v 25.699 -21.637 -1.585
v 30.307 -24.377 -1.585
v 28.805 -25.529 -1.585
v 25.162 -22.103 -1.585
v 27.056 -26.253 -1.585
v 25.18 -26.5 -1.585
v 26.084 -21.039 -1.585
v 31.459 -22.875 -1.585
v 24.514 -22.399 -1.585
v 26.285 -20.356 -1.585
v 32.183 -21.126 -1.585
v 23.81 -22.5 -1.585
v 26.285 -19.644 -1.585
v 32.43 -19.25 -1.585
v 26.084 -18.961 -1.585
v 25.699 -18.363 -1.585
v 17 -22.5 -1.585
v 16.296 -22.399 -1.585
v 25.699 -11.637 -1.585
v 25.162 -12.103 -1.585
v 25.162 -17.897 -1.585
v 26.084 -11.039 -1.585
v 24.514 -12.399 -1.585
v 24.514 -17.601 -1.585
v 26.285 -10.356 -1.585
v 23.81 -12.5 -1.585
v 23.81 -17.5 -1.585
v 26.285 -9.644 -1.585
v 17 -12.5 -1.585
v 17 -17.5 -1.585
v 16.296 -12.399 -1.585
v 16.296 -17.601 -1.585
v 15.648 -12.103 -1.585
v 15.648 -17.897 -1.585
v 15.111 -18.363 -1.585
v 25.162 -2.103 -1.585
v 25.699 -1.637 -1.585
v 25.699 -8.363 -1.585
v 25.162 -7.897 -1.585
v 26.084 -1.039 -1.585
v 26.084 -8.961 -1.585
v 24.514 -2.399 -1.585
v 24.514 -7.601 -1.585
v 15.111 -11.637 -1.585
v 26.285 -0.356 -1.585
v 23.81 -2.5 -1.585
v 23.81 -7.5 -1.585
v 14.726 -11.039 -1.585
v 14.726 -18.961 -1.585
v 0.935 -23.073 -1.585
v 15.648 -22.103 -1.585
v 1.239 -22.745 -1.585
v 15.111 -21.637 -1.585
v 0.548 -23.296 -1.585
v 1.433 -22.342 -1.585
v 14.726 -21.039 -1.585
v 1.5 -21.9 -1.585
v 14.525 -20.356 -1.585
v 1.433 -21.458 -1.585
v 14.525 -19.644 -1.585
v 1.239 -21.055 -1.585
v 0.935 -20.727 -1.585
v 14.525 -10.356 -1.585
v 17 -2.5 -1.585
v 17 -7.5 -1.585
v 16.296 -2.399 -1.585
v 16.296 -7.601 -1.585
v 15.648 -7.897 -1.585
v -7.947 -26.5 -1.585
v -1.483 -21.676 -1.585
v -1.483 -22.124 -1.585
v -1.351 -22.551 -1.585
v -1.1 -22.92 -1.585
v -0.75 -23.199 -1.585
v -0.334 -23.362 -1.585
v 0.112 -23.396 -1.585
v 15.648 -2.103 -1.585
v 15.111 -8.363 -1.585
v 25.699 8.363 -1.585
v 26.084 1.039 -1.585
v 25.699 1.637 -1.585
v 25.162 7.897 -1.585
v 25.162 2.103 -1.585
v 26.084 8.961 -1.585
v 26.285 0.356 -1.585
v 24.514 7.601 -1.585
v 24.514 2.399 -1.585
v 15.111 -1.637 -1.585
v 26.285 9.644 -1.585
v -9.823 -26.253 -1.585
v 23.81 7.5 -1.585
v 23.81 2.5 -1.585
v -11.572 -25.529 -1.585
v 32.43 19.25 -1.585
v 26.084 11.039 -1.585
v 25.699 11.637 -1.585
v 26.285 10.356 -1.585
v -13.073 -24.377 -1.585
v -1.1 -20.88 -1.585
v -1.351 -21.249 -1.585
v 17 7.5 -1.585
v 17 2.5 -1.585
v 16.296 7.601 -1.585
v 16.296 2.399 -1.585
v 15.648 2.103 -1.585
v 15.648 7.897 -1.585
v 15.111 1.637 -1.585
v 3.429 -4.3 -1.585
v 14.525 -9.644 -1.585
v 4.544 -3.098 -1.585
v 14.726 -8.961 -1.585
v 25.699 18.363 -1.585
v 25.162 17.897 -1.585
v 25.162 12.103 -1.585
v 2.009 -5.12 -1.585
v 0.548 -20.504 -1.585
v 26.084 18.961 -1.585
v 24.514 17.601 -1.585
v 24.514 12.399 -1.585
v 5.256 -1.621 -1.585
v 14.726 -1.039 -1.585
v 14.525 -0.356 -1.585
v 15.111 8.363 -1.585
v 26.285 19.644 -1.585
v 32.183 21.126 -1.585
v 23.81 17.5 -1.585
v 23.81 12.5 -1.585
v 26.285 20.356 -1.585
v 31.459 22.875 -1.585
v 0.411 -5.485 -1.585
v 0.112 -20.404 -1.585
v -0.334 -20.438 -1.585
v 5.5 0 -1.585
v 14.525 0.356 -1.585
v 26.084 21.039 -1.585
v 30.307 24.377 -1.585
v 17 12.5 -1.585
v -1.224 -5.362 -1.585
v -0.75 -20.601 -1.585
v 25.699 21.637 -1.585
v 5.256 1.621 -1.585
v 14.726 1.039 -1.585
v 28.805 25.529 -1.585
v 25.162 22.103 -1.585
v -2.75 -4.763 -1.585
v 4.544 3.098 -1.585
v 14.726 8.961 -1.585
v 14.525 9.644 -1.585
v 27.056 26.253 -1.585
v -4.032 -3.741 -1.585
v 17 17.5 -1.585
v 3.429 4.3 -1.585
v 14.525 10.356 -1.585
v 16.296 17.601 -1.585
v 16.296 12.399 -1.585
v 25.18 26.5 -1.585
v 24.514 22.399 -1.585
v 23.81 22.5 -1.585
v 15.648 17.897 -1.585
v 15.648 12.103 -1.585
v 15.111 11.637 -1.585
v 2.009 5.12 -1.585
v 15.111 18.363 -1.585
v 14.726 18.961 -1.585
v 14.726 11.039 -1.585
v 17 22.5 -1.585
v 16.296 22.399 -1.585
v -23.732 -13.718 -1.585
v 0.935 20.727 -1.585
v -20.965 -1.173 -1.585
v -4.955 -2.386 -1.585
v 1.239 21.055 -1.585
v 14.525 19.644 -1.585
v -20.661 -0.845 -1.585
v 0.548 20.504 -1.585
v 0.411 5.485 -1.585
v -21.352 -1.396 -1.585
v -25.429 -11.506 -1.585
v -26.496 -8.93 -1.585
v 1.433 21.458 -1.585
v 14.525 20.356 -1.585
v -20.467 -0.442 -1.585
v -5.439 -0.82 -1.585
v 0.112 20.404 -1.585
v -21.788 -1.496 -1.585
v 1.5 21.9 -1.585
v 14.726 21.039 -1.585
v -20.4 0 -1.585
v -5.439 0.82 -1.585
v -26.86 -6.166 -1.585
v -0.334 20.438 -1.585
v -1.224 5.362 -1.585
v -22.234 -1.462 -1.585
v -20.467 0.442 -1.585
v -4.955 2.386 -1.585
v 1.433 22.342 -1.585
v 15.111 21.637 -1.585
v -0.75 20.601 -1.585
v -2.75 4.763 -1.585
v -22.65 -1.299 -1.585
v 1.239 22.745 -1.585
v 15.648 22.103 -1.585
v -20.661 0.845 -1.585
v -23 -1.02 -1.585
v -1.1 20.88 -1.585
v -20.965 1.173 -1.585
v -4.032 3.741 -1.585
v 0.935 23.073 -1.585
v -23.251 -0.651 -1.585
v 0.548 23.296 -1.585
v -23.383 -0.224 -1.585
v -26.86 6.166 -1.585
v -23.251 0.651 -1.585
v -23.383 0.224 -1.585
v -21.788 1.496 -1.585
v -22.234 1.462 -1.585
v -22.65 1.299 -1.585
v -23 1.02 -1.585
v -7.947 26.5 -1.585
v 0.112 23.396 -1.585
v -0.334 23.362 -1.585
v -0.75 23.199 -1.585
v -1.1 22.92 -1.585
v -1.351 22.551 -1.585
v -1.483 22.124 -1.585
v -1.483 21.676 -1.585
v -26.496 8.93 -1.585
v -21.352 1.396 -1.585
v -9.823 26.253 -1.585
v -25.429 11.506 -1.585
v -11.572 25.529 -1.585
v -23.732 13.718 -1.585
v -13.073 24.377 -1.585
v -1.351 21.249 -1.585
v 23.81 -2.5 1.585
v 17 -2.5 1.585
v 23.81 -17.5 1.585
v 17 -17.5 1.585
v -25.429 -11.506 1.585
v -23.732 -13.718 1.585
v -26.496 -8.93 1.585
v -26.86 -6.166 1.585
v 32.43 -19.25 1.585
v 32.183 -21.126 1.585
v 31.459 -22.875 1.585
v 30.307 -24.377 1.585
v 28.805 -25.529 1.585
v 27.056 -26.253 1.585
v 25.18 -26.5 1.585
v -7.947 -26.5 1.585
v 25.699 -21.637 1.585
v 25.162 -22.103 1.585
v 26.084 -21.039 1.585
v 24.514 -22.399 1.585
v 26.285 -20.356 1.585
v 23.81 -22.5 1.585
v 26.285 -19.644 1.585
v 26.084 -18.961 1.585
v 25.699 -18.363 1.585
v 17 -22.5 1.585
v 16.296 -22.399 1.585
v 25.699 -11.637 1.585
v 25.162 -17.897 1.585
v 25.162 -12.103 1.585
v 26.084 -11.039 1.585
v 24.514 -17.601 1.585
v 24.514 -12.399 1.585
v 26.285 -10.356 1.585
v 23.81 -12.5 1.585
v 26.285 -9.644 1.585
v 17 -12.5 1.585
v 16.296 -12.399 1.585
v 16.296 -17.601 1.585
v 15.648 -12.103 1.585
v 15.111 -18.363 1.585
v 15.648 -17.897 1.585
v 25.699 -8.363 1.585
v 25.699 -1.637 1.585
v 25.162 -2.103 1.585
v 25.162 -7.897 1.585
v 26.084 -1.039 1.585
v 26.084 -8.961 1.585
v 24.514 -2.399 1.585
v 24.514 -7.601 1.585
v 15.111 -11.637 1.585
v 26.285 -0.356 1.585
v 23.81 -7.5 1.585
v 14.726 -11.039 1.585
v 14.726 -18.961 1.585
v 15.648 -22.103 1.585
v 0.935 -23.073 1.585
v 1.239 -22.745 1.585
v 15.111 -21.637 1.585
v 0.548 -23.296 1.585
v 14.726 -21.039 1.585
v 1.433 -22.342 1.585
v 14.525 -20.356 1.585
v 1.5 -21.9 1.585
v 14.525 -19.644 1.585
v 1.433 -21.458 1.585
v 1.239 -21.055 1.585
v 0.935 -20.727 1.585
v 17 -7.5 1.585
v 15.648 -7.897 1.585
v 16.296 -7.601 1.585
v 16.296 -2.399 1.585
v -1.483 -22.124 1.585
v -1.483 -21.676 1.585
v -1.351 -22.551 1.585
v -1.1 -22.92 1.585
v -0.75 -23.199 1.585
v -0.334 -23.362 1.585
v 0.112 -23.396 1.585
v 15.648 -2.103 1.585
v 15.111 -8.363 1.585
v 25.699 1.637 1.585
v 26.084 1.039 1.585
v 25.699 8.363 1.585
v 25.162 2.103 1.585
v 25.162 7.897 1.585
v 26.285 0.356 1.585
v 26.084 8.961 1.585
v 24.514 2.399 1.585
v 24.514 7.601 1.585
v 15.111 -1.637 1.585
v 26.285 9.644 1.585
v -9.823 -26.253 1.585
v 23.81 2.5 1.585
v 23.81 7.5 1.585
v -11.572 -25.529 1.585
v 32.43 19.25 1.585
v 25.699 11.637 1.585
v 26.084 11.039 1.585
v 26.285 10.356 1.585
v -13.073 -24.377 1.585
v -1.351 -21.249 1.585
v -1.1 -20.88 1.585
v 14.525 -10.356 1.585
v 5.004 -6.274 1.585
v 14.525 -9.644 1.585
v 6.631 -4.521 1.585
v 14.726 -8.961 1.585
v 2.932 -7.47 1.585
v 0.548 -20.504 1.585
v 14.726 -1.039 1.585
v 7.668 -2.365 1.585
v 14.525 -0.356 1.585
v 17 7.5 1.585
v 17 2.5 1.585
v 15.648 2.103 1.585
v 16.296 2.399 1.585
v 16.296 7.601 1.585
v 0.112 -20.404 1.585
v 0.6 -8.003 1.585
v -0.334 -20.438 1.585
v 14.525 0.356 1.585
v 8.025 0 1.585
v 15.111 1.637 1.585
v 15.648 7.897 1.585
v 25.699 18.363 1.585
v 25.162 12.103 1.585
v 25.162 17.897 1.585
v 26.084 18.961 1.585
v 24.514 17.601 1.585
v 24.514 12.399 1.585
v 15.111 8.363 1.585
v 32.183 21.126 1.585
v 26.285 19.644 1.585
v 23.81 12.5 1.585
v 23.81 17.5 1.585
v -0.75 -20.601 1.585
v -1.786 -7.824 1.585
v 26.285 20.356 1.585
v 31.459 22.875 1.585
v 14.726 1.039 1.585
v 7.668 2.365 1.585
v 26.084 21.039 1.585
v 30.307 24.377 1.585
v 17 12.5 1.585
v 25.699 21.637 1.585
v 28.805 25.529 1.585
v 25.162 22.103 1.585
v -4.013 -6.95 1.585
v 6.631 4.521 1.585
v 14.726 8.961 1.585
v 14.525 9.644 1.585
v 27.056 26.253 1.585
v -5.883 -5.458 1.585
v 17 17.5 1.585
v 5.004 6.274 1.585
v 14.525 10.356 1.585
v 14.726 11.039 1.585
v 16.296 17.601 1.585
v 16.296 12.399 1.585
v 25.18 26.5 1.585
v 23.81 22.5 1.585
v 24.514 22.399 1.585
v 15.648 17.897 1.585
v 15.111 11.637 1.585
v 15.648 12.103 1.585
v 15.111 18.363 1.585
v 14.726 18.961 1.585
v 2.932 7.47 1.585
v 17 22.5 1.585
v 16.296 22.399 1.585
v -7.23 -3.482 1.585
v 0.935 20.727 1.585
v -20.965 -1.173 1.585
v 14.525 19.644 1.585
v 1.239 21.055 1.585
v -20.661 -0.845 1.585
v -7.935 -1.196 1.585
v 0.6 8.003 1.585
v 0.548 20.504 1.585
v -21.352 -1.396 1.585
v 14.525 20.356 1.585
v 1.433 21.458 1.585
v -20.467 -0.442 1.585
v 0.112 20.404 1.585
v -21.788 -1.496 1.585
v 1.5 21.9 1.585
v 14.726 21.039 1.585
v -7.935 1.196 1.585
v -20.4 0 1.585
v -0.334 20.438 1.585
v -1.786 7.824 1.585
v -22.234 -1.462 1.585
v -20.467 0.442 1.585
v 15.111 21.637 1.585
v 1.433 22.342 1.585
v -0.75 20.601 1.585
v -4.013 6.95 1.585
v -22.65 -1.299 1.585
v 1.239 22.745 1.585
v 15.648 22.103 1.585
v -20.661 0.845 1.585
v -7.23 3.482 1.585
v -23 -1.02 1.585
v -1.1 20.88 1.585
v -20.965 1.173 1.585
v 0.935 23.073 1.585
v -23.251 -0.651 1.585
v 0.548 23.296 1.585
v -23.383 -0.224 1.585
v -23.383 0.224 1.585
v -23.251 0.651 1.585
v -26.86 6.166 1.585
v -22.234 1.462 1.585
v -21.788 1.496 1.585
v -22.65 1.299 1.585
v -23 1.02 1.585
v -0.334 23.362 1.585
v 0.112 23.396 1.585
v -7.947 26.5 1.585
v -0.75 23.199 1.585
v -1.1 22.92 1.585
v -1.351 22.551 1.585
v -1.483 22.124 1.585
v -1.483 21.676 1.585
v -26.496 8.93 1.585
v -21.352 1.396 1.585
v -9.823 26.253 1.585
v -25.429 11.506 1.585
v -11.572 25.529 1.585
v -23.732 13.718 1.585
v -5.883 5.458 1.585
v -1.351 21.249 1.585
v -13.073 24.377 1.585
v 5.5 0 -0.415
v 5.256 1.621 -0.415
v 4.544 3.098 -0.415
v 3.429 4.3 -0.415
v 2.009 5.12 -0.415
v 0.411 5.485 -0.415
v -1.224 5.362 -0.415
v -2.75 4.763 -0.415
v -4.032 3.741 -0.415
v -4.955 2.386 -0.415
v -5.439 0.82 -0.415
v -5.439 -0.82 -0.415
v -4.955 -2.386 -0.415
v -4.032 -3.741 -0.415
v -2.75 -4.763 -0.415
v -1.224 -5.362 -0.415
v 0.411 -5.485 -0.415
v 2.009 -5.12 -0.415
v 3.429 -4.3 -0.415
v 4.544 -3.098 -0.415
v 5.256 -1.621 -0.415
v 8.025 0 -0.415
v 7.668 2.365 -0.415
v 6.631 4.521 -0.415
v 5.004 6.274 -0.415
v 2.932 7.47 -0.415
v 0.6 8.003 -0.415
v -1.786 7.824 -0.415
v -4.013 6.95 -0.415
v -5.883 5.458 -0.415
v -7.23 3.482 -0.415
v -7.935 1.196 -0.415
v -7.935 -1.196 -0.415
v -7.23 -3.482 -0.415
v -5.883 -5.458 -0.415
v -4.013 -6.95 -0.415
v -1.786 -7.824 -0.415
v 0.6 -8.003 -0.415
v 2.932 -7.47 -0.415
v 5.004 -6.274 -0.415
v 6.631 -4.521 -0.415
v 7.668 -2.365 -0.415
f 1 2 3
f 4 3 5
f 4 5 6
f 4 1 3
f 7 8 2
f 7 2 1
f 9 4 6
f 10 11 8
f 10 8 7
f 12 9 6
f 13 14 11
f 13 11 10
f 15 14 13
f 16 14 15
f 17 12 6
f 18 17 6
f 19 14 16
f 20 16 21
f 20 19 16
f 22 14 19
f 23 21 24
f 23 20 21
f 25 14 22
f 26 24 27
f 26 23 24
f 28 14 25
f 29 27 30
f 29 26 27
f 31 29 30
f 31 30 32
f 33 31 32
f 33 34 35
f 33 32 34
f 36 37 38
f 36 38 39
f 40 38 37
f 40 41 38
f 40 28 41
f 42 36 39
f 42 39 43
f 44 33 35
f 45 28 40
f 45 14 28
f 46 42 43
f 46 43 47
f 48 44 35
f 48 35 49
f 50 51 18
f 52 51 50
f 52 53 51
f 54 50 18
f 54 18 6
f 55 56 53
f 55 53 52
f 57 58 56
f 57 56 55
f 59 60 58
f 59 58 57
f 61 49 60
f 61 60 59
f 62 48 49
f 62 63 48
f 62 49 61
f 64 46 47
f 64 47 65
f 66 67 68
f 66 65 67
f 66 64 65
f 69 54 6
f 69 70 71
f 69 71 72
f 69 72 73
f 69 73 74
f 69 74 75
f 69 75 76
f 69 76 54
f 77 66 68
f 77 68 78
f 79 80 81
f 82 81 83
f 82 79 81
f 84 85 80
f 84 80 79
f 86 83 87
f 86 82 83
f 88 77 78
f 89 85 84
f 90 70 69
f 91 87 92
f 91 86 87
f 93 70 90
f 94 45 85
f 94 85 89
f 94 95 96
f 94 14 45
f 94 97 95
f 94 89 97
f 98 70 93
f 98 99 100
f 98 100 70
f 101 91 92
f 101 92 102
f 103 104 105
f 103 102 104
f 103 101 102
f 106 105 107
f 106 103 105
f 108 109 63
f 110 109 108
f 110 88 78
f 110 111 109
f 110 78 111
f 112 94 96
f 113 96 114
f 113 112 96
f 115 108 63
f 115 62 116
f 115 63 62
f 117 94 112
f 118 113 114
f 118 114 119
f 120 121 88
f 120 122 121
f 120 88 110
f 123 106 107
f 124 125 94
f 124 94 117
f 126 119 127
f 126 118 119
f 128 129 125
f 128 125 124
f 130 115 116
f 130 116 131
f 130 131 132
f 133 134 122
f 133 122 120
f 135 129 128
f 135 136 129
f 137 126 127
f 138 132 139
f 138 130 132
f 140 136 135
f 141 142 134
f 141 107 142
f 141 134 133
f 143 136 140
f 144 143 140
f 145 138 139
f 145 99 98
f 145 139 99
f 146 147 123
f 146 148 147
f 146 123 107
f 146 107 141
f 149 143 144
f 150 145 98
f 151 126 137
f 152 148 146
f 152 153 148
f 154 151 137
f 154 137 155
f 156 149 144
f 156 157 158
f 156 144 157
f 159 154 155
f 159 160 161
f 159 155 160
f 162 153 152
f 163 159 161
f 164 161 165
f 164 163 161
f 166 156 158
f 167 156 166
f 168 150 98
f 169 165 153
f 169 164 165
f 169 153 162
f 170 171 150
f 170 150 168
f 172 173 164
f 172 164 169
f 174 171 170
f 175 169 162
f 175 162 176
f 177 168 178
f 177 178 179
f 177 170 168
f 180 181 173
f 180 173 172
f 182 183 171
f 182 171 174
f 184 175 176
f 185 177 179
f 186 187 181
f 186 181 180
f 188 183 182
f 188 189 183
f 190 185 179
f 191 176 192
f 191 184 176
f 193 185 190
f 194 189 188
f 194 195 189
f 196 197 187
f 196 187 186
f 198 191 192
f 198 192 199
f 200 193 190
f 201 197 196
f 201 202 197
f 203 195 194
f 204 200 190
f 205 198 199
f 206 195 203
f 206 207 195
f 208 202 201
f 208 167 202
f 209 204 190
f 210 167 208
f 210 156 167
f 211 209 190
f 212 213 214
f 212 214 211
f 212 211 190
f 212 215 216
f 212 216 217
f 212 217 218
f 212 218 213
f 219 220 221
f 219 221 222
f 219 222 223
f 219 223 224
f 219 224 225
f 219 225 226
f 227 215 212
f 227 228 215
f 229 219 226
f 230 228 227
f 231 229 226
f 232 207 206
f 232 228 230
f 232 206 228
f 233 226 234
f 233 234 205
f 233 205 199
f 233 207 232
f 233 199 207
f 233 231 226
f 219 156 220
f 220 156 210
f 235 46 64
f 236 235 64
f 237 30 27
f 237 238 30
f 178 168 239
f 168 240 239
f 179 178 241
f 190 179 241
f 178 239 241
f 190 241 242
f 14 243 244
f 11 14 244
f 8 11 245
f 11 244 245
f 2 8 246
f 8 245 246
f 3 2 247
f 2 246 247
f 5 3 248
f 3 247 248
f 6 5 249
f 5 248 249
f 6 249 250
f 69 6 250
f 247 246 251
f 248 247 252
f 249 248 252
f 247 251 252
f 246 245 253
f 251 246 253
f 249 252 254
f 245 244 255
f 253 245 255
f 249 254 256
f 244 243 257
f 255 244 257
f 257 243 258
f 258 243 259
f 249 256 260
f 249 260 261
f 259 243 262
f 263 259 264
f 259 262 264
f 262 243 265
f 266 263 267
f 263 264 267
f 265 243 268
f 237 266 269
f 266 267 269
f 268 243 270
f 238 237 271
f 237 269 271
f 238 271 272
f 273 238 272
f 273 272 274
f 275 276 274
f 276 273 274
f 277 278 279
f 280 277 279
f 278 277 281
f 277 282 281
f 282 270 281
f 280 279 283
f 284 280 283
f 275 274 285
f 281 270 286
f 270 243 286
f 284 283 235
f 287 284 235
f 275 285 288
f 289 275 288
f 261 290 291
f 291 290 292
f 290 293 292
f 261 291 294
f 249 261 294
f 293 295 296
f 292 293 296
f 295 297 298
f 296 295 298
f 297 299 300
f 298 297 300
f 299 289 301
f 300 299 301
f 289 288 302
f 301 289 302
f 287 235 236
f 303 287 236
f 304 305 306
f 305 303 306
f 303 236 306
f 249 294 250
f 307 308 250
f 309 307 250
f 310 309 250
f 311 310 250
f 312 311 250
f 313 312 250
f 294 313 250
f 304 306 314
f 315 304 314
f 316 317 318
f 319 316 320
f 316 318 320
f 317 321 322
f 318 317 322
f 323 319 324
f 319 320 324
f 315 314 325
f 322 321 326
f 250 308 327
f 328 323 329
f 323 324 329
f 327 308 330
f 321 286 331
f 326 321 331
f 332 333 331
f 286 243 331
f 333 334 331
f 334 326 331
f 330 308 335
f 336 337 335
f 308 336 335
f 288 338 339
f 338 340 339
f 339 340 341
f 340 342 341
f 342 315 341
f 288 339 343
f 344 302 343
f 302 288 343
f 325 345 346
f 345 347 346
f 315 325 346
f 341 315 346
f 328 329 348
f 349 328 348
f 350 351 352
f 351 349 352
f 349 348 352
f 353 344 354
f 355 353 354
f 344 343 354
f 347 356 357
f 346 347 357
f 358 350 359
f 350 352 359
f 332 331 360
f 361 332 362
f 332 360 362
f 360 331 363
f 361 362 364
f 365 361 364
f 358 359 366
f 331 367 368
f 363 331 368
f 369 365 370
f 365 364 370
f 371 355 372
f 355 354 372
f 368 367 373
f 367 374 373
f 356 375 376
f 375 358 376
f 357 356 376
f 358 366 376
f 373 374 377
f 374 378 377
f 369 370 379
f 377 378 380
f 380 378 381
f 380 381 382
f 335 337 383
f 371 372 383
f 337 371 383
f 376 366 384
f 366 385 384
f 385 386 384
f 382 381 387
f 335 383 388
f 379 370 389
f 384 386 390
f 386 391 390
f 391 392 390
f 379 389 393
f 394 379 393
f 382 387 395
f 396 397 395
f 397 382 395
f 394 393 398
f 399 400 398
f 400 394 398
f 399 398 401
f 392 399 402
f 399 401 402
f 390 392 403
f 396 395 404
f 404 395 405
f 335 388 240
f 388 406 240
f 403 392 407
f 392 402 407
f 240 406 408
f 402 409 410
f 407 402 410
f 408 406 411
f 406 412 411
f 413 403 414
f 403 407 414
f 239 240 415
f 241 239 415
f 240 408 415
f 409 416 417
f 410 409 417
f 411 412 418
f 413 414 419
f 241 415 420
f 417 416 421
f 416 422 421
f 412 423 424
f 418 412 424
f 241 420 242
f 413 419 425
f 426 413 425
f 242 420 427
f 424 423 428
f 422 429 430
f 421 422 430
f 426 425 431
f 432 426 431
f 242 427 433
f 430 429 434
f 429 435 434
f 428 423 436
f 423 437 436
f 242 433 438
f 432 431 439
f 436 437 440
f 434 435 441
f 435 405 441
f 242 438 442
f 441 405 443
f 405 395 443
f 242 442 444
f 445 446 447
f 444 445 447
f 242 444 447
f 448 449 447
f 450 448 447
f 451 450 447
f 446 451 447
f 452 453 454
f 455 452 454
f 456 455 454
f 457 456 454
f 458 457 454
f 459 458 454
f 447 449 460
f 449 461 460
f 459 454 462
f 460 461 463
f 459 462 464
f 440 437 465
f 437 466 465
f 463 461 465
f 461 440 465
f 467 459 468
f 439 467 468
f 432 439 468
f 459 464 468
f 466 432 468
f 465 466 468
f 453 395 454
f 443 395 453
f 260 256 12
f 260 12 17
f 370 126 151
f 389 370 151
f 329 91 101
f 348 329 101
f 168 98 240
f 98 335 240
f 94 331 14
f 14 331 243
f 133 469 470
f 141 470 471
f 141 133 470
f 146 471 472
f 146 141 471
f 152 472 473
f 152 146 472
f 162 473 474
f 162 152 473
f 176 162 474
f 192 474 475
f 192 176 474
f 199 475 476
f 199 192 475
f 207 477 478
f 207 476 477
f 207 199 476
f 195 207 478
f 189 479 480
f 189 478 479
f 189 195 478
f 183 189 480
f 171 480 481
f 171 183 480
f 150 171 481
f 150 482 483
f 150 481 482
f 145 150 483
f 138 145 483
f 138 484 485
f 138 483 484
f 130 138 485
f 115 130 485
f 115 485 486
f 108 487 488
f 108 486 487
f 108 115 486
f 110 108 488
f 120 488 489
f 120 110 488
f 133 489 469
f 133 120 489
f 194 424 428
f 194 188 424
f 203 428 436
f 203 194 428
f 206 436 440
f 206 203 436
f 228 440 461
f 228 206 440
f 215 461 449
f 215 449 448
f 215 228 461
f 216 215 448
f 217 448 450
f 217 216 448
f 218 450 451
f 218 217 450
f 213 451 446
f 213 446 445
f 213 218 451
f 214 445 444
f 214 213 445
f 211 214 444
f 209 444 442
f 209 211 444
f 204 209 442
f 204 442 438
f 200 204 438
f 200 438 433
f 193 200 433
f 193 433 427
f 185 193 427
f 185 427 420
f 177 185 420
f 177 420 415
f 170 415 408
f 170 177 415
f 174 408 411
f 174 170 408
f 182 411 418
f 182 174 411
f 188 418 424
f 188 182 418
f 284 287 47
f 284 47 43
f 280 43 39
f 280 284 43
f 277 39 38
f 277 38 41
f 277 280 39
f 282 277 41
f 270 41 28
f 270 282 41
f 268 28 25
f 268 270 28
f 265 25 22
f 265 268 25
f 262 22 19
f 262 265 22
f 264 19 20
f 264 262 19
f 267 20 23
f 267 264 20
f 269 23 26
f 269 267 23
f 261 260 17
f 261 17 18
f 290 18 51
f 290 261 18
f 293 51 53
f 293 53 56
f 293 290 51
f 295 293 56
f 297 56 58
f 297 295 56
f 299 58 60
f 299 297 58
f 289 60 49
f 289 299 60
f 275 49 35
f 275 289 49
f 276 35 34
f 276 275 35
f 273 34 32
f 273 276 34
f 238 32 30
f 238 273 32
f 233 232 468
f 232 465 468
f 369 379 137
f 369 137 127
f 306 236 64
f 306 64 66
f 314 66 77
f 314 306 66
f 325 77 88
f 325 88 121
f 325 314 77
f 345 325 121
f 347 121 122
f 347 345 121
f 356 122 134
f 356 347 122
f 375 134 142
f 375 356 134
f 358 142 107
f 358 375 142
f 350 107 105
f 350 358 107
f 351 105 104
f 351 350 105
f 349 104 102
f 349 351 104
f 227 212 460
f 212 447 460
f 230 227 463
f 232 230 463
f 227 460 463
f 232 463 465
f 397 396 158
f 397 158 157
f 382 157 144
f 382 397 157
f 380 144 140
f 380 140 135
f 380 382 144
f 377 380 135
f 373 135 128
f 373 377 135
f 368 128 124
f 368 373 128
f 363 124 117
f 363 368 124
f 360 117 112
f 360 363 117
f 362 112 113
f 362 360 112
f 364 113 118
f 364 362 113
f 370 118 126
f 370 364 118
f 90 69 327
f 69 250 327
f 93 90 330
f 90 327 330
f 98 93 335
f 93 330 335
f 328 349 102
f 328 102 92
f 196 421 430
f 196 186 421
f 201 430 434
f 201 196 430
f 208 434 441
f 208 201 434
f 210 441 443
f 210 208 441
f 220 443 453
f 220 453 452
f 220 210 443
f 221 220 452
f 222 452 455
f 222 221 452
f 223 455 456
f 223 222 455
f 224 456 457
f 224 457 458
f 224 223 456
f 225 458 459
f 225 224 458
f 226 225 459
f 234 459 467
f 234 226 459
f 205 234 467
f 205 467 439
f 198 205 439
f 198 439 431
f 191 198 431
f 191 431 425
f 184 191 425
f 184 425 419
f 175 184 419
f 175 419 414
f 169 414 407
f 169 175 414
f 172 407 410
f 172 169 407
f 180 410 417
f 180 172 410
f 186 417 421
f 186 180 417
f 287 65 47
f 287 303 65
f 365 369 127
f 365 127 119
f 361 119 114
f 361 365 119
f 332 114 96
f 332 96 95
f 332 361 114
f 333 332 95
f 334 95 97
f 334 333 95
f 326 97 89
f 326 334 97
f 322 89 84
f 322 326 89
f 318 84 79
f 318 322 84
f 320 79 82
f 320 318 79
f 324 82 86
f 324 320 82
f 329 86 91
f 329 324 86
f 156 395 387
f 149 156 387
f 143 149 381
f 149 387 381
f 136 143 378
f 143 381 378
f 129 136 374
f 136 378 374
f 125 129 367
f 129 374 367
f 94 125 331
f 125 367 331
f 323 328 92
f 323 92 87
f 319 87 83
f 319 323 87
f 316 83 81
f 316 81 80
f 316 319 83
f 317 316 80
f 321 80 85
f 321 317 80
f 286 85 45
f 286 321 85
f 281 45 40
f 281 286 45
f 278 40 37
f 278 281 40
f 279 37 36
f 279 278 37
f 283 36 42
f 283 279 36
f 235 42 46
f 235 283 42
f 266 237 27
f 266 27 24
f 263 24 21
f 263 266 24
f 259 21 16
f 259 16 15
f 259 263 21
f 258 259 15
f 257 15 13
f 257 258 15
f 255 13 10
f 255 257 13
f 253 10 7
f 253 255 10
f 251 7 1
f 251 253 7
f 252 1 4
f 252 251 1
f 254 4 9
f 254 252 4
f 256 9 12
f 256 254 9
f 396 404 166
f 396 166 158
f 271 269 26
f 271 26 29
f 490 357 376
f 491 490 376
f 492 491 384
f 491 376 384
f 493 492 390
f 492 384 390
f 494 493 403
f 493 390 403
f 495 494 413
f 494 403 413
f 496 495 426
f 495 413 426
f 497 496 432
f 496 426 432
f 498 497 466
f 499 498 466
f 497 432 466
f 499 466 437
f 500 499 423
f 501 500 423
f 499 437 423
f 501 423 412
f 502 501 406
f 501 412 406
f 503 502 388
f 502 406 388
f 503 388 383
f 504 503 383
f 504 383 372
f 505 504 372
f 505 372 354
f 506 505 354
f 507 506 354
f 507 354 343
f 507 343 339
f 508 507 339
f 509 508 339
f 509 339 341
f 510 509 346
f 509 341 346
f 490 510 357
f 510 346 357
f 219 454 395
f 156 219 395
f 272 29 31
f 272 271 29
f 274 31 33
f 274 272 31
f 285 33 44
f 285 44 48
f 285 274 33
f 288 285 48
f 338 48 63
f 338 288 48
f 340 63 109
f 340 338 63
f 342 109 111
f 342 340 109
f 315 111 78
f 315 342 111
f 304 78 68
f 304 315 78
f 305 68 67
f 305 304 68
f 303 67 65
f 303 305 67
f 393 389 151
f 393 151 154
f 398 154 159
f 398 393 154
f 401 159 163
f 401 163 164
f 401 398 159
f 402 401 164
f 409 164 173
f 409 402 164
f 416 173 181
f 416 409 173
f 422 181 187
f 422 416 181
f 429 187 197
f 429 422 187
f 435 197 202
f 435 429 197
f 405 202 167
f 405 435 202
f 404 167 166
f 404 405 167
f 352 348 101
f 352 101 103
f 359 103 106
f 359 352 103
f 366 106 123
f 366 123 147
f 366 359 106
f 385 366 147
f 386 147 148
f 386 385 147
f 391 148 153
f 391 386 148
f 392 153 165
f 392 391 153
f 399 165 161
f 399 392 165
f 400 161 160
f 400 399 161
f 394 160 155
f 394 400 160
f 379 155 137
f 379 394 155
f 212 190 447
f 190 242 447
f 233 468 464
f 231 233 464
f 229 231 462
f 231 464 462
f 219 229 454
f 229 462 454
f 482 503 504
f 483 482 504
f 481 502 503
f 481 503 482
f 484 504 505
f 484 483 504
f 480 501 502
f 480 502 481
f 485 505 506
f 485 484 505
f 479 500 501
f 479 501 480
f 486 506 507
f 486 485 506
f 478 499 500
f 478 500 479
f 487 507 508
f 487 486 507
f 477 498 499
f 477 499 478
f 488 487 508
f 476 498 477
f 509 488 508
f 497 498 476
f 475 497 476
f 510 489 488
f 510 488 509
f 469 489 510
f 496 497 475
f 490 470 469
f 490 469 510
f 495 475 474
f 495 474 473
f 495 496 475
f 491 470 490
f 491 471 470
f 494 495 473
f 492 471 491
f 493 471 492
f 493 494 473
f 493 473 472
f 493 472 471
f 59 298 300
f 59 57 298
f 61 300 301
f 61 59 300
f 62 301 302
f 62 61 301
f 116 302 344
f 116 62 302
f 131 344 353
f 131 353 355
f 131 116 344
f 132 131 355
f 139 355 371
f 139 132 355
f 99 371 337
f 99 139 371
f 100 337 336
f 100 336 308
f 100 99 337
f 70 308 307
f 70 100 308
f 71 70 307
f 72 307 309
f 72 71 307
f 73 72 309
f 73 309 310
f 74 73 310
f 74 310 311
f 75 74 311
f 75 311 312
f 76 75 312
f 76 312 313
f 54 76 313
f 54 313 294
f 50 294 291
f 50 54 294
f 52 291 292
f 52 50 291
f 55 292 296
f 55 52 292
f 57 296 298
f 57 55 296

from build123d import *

# Parameters (mm, degrees)
SKETCH1_R           = 5.5
SKETCH1_R_2         = 1.5
BOSS_EXTRUDE1_DEPTH = 1.585
SKETCH3_R           = 8.025
CUT_EXTRUDE1_DEPTH  = 2


with BuildPart() as part:
    # Sketch1 → Boss-Extrude1 (new body, symmetric)
    with BuildSketch(Plane.XY):
        with BuildLine():
            Line((25.18, -26.5), (-7.946951673, -26.5))
            ThreePointArc((-7.946951673, -26.5), (-10.721406557, -25.948126611), (-13.073475836, -24.376524164))
            Line((-13.073475836, -24.376524164), (-23.731900423, -13.718099577))
            ThreePointArc((-23.731900423, -13.718099577), (-26.047033407, -10.253258212), (-26.86, -6.166199154))
            Line((-26.86, -6.166199154), (-26.86, 6.166199154))
            ThreePointArc((-26.86, 6.166199154), (-26.047033407, 10.253258212), (-23.731900423, 13.718099577))
            Line((-23.731900423, 13.718099577), (-13.073475836, 24.376524164))
            ThreePointArc((-13.073475836, 24.376524164), (-10.721406557, 25.948126611), (-7.946951673, 26.5))
            Line((-7.946951673, 26.5), (25.18, 26.5))
            ThreePointArc((25.18, 26.5), (30.306524164, 24.376524164), (32.43, 19.25))
            Line((32.43, 19.25), (32.43, -19.25))
            ThreePointArc((32.43, -19.25), (30.306524164, -24.376524164), (25.18, -26.5))
        make_face()
        Circle(SKETCH1_R, mode=Mode.SUBTRACT)
        with Locations((0, 21.9)):
            Circle(SKETCH1_R_2, mode=Mode.SUBTRACT)
        with Locations((-21.9, 0)):
            Circle(SKETCH1_R_2, mode=Mode.SUBTRACT)
        with Locations((0, -21.9)):
            Circle(SKETCH1_R_2, mode=Mode.SUBTRACT)
        with BuildLine():
            Line((17, 22.5), (23.81, 22.5))
            ThreePointArc((23.81, 22.5), (26.31, 20), (23.81, 17.5))
            Line((23.81, 17.5), (17, 17.5))
            ThreePointArc((17, 17.5), (14.5, 20), (17, 22.5))
        make_face(mode=Mode.SUBTRACT)
        with BuildLine():
            Line((17, 12.5), (23.81, 12.5))
            ThreePointArc((23.81, 12.5), (26.31, 10), (23.81, 7.5))
            Line((23.81, 7.5), (17, 7.5))
            ThreePointArc((17, 7.5), (14.5, 10), (17, 12.5))
        make_face(mode=Mode.SUBTRACT)
        with BuildLine():
            Line((17, 2.5), (23.81, 2.5))
            ThreePointArc((23.81, 2.5), (26.31, 0), (23.81, -2.5))
            Line((23.81, -2.5), (17, -2.5))
            ThreePointArc((17, -2.5), (14.5, 0), (17, 2.5))
        make_face(mode=Mode.SUBTRACT)
        with BuildLine():
            Line((17, -7.5), (23.81, -7.5))
            ThreePointArc((23.81, -7.5), (26.31, -10), (23.81, -12.5))
            Line((23.81, -12.5), (17, -12.5))
            ThreePointArc((17, -12.5), (14.5, -10), (17, -7.5))
        make_face(mode=Mode.SUBTRACT)
        with BuildLine():
            Line((17, -17.5), (23.81, -17.5))
            ThreePointArc((23.81, -17.5), (26.31, -20), (23.81, -22.5))
            Line((23.81, -22.5), (17, -22.5))
            ThreePointArc((17, -22.5), (14.5, -20), (17, -17.5))
        make_face(mode=Mode.SUBTRACT)
    extrude(amount=BOSS_EXTRUDE1_DEPTH, both=True)

    # Sketch3 → Cut-Extrude1 (cut)
    with BuildSketch(Plane.XY.offset(1.585)):
        Circle(SKETCH3_R)
    extrude(amount=-CUT_EXTRUDE1_DEPTH, mode=Mode.SUBTRACT)


solid = part.part
